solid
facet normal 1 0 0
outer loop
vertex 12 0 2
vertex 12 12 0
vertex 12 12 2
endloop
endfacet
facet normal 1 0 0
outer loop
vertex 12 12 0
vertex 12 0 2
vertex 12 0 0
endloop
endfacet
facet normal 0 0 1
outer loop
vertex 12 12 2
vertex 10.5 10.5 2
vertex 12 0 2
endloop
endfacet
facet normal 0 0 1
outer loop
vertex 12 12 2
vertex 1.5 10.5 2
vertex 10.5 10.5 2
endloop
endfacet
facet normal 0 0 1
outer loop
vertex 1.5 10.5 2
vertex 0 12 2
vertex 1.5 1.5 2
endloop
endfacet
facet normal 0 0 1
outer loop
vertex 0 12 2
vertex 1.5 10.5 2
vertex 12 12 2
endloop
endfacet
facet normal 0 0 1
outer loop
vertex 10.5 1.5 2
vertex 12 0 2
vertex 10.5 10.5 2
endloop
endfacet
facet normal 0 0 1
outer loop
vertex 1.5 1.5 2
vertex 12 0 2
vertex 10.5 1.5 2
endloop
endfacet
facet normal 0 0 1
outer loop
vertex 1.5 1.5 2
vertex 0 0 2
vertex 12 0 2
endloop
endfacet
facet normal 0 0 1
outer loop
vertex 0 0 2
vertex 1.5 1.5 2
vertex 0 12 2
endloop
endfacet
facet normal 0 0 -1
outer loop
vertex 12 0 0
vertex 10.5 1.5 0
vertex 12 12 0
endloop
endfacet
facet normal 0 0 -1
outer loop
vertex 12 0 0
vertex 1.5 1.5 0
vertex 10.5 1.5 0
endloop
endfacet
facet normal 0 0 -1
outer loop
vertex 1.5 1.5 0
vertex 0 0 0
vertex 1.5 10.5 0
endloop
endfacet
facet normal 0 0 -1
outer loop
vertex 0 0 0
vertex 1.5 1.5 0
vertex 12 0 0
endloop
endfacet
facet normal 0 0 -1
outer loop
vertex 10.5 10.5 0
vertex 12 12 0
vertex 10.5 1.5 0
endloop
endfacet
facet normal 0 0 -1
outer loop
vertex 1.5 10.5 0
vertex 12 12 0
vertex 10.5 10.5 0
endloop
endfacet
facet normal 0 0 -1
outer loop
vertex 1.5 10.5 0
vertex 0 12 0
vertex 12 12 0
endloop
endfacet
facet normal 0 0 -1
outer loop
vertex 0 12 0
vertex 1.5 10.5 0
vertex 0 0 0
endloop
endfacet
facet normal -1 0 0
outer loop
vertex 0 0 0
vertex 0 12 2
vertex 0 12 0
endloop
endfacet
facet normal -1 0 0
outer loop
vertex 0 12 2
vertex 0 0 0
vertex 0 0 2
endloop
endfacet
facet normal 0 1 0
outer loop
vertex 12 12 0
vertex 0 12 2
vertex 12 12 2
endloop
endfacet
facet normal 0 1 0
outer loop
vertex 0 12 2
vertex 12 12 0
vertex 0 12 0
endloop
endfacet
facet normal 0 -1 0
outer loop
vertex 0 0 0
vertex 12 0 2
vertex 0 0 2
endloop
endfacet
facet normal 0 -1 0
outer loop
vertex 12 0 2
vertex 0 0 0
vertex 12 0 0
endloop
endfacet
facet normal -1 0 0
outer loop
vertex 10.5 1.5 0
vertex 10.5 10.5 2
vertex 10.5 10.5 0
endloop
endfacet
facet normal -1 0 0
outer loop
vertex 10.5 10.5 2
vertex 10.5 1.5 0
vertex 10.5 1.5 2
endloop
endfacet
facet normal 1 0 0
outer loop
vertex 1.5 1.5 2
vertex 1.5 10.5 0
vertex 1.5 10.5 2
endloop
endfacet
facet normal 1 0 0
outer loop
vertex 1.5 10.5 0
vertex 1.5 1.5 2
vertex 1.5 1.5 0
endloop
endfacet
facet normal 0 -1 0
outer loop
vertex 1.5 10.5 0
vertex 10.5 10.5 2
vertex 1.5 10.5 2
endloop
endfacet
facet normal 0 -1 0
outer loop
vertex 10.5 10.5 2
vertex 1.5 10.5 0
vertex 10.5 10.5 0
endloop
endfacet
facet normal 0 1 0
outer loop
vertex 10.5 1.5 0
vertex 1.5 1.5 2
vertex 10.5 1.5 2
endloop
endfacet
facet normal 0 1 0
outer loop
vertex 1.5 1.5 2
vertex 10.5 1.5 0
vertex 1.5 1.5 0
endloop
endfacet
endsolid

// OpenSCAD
/* RailEduKit/InteractiveSignallingLaboratory © 2025 by Martin Scheidt and contributors
 * License: CC-BY 4.0 - https://creativecommons.org/licenses/by/4.0/
 * Project description: The Interactive Signalling Laboratory is a tool for training in Rail
 * Applications to enhance the knowledge of control and signalling principles for rail transport systems.
 *
 * Module: signal_symbol
 */

 // Include configuration file
include <../config/global_variables.scad>

module symbol_block() {
	difference() {
		cube([ signal_symbol_size, signal_symbol_size, engraving_height ]);
		translate([ engraving_thickness, engraving_thickness, 0 ])
		cube([
			signal_symbol_size - 2 * engraving_thickness, signal_symbol_size - 2 * engraving_thickness,
			engraving_height
		]);
	}
}

symbol_block();
